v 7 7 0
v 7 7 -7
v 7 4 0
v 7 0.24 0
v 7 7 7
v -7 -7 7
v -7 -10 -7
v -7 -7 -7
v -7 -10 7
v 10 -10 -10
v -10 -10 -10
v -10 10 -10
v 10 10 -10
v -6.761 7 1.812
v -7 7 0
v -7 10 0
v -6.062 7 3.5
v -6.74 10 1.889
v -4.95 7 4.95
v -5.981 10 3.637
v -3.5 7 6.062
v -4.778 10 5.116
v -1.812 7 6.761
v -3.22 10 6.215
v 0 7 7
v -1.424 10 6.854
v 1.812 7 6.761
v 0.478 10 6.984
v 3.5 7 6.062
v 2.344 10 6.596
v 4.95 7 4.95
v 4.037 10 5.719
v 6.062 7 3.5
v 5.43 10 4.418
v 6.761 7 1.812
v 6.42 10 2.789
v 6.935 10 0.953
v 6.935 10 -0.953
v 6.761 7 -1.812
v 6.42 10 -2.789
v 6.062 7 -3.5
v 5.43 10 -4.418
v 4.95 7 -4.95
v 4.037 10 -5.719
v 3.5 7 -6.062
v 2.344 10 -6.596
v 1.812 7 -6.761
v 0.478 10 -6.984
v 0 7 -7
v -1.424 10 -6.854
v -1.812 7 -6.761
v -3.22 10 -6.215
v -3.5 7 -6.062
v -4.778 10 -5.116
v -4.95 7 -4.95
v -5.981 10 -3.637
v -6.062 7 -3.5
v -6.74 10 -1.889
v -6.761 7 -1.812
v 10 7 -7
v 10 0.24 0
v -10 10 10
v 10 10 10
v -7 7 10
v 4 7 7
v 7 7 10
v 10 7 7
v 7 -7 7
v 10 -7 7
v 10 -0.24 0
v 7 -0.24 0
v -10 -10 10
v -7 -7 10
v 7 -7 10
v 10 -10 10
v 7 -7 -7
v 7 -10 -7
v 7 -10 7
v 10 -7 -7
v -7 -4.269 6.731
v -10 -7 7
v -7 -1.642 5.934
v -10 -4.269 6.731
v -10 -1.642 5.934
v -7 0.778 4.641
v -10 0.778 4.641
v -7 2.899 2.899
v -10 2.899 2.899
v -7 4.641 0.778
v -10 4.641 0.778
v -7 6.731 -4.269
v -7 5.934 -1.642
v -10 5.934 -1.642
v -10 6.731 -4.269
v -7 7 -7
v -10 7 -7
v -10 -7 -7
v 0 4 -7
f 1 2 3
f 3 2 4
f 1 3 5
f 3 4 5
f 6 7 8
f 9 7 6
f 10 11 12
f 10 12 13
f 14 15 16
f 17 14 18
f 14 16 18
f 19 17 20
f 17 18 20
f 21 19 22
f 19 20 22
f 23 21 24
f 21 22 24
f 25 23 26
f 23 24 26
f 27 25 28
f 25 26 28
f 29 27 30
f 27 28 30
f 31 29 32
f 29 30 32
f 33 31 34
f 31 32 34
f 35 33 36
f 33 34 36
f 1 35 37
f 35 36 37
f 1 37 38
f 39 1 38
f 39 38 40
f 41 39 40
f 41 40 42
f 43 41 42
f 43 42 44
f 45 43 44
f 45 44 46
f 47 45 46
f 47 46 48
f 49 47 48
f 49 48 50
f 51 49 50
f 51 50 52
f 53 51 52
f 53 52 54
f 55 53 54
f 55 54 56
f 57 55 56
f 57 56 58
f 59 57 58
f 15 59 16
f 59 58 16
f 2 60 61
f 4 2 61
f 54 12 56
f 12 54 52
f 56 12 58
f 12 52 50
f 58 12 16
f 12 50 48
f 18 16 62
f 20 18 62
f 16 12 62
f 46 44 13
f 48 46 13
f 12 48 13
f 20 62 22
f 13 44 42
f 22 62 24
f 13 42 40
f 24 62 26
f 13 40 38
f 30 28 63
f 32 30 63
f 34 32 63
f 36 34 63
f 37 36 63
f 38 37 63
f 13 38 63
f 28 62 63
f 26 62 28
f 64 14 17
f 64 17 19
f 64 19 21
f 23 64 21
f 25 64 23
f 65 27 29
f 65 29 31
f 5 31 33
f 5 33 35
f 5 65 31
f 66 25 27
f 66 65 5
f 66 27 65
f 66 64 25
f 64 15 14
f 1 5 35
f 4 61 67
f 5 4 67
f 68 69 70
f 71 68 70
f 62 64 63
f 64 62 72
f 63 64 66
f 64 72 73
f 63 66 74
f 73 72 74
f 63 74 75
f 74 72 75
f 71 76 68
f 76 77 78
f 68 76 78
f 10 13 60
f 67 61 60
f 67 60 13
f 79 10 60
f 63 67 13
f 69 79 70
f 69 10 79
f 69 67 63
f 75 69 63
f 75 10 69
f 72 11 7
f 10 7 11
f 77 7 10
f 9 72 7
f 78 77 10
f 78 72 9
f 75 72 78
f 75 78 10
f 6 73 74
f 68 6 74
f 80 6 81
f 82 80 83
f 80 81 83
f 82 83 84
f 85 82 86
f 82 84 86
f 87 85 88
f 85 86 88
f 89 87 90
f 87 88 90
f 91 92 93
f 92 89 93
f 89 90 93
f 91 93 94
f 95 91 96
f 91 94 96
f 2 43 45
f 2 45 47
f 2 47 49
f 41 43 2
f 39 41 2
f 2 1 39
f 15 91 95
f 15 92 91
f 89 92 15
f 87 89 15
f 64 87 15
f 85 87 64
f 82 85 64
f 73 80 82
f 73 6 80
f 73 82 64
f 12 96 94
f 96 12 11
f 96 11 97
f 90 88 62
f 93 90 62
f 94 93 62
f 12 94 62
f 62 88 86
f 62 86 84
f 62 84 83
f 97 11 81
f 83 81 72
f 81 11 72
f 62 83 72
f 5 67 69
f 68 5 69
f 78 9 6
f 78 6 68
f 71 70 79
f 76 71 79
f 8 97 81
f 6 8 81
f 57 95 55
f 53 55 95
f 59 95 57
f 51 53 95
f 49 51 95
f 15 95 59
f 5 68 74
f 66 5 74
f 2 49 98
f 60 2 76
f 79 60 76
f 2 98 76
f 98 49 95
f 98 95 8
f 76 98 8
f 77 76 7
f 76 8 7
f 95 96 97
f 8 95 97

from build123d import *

# Parameters (mm, degrees)
F0_W      = 20
F0_H      = 20
F1_DEPTH  = 10
F2_T      = -3
F3_R      = 7
F4_DEPTH  = 6
F5_W      = 14
F5_H      = 14
F6_DEPTH  = 6
F8_DEPTH  = 6
F10_DEPTH = 6


with BuildPart() as f1:
    # F0 (on Front) → F1 (new body, symmetric)
    with BuildSketch(Plane.XZ):
        Rectangle(F0_W, F0_H)
    extrude(amount=F1_DEPTH, both=True)

    # F2
    f2_openings = [f1.faces().sort_by_distance(p)[0] for p in [
        (0, 0, 10),
    ]]
    offset(amount=F2_T, openings=f2_openings)

    # F3 (on face) → F4 (cut)
    with BuildSketch(Plane(origin=(0, 10, 0), x_dir=(-1, 0, 0), z_dir=(0, 1, 0))):
        Circle(F3_R)
    extrude(amount=-F4_DEPTH, mode=Mode.SUBTRACT)

    # F5 (on face) → F6 (cut)
    with BuildSketch(Plane.XZ.offset(10)):
        Rectangle(F5_W, F5_H)
    extrude(amount=-F6_DEPTH, mode=Mode.SUBTRACT)

    # F7 (on face) → F8 (cut)
    with BuildSketch(Plane.YZ.offset(10)):
        Polygon((-0.240179, 0), (-7, -7), (7, -7), (0.240179, 0), (7, 7), (-7, 7), align=None)
    extrude(amount=-F8_DEPTH, mode=Mode.SUBTRACT)

    # F9 (on face) → F10 (cut)
    with BuildSketch(Plane(origin=(-10, 0, 0), x_dir=(0, -1, 0), z_dir=(-1, 0, 0))):
        with BuildLine():
            ThreePointArc((7, 7), (-2.899495, 2.899495), (-7, -7))
            Line((-7, -7), (7, -7))
            Line((7, -7), (7, 7))
        make_face()
    extrude(amount=-F10_DEPTH, mode=Mode.SUBTRACT)


solid = f1.part
